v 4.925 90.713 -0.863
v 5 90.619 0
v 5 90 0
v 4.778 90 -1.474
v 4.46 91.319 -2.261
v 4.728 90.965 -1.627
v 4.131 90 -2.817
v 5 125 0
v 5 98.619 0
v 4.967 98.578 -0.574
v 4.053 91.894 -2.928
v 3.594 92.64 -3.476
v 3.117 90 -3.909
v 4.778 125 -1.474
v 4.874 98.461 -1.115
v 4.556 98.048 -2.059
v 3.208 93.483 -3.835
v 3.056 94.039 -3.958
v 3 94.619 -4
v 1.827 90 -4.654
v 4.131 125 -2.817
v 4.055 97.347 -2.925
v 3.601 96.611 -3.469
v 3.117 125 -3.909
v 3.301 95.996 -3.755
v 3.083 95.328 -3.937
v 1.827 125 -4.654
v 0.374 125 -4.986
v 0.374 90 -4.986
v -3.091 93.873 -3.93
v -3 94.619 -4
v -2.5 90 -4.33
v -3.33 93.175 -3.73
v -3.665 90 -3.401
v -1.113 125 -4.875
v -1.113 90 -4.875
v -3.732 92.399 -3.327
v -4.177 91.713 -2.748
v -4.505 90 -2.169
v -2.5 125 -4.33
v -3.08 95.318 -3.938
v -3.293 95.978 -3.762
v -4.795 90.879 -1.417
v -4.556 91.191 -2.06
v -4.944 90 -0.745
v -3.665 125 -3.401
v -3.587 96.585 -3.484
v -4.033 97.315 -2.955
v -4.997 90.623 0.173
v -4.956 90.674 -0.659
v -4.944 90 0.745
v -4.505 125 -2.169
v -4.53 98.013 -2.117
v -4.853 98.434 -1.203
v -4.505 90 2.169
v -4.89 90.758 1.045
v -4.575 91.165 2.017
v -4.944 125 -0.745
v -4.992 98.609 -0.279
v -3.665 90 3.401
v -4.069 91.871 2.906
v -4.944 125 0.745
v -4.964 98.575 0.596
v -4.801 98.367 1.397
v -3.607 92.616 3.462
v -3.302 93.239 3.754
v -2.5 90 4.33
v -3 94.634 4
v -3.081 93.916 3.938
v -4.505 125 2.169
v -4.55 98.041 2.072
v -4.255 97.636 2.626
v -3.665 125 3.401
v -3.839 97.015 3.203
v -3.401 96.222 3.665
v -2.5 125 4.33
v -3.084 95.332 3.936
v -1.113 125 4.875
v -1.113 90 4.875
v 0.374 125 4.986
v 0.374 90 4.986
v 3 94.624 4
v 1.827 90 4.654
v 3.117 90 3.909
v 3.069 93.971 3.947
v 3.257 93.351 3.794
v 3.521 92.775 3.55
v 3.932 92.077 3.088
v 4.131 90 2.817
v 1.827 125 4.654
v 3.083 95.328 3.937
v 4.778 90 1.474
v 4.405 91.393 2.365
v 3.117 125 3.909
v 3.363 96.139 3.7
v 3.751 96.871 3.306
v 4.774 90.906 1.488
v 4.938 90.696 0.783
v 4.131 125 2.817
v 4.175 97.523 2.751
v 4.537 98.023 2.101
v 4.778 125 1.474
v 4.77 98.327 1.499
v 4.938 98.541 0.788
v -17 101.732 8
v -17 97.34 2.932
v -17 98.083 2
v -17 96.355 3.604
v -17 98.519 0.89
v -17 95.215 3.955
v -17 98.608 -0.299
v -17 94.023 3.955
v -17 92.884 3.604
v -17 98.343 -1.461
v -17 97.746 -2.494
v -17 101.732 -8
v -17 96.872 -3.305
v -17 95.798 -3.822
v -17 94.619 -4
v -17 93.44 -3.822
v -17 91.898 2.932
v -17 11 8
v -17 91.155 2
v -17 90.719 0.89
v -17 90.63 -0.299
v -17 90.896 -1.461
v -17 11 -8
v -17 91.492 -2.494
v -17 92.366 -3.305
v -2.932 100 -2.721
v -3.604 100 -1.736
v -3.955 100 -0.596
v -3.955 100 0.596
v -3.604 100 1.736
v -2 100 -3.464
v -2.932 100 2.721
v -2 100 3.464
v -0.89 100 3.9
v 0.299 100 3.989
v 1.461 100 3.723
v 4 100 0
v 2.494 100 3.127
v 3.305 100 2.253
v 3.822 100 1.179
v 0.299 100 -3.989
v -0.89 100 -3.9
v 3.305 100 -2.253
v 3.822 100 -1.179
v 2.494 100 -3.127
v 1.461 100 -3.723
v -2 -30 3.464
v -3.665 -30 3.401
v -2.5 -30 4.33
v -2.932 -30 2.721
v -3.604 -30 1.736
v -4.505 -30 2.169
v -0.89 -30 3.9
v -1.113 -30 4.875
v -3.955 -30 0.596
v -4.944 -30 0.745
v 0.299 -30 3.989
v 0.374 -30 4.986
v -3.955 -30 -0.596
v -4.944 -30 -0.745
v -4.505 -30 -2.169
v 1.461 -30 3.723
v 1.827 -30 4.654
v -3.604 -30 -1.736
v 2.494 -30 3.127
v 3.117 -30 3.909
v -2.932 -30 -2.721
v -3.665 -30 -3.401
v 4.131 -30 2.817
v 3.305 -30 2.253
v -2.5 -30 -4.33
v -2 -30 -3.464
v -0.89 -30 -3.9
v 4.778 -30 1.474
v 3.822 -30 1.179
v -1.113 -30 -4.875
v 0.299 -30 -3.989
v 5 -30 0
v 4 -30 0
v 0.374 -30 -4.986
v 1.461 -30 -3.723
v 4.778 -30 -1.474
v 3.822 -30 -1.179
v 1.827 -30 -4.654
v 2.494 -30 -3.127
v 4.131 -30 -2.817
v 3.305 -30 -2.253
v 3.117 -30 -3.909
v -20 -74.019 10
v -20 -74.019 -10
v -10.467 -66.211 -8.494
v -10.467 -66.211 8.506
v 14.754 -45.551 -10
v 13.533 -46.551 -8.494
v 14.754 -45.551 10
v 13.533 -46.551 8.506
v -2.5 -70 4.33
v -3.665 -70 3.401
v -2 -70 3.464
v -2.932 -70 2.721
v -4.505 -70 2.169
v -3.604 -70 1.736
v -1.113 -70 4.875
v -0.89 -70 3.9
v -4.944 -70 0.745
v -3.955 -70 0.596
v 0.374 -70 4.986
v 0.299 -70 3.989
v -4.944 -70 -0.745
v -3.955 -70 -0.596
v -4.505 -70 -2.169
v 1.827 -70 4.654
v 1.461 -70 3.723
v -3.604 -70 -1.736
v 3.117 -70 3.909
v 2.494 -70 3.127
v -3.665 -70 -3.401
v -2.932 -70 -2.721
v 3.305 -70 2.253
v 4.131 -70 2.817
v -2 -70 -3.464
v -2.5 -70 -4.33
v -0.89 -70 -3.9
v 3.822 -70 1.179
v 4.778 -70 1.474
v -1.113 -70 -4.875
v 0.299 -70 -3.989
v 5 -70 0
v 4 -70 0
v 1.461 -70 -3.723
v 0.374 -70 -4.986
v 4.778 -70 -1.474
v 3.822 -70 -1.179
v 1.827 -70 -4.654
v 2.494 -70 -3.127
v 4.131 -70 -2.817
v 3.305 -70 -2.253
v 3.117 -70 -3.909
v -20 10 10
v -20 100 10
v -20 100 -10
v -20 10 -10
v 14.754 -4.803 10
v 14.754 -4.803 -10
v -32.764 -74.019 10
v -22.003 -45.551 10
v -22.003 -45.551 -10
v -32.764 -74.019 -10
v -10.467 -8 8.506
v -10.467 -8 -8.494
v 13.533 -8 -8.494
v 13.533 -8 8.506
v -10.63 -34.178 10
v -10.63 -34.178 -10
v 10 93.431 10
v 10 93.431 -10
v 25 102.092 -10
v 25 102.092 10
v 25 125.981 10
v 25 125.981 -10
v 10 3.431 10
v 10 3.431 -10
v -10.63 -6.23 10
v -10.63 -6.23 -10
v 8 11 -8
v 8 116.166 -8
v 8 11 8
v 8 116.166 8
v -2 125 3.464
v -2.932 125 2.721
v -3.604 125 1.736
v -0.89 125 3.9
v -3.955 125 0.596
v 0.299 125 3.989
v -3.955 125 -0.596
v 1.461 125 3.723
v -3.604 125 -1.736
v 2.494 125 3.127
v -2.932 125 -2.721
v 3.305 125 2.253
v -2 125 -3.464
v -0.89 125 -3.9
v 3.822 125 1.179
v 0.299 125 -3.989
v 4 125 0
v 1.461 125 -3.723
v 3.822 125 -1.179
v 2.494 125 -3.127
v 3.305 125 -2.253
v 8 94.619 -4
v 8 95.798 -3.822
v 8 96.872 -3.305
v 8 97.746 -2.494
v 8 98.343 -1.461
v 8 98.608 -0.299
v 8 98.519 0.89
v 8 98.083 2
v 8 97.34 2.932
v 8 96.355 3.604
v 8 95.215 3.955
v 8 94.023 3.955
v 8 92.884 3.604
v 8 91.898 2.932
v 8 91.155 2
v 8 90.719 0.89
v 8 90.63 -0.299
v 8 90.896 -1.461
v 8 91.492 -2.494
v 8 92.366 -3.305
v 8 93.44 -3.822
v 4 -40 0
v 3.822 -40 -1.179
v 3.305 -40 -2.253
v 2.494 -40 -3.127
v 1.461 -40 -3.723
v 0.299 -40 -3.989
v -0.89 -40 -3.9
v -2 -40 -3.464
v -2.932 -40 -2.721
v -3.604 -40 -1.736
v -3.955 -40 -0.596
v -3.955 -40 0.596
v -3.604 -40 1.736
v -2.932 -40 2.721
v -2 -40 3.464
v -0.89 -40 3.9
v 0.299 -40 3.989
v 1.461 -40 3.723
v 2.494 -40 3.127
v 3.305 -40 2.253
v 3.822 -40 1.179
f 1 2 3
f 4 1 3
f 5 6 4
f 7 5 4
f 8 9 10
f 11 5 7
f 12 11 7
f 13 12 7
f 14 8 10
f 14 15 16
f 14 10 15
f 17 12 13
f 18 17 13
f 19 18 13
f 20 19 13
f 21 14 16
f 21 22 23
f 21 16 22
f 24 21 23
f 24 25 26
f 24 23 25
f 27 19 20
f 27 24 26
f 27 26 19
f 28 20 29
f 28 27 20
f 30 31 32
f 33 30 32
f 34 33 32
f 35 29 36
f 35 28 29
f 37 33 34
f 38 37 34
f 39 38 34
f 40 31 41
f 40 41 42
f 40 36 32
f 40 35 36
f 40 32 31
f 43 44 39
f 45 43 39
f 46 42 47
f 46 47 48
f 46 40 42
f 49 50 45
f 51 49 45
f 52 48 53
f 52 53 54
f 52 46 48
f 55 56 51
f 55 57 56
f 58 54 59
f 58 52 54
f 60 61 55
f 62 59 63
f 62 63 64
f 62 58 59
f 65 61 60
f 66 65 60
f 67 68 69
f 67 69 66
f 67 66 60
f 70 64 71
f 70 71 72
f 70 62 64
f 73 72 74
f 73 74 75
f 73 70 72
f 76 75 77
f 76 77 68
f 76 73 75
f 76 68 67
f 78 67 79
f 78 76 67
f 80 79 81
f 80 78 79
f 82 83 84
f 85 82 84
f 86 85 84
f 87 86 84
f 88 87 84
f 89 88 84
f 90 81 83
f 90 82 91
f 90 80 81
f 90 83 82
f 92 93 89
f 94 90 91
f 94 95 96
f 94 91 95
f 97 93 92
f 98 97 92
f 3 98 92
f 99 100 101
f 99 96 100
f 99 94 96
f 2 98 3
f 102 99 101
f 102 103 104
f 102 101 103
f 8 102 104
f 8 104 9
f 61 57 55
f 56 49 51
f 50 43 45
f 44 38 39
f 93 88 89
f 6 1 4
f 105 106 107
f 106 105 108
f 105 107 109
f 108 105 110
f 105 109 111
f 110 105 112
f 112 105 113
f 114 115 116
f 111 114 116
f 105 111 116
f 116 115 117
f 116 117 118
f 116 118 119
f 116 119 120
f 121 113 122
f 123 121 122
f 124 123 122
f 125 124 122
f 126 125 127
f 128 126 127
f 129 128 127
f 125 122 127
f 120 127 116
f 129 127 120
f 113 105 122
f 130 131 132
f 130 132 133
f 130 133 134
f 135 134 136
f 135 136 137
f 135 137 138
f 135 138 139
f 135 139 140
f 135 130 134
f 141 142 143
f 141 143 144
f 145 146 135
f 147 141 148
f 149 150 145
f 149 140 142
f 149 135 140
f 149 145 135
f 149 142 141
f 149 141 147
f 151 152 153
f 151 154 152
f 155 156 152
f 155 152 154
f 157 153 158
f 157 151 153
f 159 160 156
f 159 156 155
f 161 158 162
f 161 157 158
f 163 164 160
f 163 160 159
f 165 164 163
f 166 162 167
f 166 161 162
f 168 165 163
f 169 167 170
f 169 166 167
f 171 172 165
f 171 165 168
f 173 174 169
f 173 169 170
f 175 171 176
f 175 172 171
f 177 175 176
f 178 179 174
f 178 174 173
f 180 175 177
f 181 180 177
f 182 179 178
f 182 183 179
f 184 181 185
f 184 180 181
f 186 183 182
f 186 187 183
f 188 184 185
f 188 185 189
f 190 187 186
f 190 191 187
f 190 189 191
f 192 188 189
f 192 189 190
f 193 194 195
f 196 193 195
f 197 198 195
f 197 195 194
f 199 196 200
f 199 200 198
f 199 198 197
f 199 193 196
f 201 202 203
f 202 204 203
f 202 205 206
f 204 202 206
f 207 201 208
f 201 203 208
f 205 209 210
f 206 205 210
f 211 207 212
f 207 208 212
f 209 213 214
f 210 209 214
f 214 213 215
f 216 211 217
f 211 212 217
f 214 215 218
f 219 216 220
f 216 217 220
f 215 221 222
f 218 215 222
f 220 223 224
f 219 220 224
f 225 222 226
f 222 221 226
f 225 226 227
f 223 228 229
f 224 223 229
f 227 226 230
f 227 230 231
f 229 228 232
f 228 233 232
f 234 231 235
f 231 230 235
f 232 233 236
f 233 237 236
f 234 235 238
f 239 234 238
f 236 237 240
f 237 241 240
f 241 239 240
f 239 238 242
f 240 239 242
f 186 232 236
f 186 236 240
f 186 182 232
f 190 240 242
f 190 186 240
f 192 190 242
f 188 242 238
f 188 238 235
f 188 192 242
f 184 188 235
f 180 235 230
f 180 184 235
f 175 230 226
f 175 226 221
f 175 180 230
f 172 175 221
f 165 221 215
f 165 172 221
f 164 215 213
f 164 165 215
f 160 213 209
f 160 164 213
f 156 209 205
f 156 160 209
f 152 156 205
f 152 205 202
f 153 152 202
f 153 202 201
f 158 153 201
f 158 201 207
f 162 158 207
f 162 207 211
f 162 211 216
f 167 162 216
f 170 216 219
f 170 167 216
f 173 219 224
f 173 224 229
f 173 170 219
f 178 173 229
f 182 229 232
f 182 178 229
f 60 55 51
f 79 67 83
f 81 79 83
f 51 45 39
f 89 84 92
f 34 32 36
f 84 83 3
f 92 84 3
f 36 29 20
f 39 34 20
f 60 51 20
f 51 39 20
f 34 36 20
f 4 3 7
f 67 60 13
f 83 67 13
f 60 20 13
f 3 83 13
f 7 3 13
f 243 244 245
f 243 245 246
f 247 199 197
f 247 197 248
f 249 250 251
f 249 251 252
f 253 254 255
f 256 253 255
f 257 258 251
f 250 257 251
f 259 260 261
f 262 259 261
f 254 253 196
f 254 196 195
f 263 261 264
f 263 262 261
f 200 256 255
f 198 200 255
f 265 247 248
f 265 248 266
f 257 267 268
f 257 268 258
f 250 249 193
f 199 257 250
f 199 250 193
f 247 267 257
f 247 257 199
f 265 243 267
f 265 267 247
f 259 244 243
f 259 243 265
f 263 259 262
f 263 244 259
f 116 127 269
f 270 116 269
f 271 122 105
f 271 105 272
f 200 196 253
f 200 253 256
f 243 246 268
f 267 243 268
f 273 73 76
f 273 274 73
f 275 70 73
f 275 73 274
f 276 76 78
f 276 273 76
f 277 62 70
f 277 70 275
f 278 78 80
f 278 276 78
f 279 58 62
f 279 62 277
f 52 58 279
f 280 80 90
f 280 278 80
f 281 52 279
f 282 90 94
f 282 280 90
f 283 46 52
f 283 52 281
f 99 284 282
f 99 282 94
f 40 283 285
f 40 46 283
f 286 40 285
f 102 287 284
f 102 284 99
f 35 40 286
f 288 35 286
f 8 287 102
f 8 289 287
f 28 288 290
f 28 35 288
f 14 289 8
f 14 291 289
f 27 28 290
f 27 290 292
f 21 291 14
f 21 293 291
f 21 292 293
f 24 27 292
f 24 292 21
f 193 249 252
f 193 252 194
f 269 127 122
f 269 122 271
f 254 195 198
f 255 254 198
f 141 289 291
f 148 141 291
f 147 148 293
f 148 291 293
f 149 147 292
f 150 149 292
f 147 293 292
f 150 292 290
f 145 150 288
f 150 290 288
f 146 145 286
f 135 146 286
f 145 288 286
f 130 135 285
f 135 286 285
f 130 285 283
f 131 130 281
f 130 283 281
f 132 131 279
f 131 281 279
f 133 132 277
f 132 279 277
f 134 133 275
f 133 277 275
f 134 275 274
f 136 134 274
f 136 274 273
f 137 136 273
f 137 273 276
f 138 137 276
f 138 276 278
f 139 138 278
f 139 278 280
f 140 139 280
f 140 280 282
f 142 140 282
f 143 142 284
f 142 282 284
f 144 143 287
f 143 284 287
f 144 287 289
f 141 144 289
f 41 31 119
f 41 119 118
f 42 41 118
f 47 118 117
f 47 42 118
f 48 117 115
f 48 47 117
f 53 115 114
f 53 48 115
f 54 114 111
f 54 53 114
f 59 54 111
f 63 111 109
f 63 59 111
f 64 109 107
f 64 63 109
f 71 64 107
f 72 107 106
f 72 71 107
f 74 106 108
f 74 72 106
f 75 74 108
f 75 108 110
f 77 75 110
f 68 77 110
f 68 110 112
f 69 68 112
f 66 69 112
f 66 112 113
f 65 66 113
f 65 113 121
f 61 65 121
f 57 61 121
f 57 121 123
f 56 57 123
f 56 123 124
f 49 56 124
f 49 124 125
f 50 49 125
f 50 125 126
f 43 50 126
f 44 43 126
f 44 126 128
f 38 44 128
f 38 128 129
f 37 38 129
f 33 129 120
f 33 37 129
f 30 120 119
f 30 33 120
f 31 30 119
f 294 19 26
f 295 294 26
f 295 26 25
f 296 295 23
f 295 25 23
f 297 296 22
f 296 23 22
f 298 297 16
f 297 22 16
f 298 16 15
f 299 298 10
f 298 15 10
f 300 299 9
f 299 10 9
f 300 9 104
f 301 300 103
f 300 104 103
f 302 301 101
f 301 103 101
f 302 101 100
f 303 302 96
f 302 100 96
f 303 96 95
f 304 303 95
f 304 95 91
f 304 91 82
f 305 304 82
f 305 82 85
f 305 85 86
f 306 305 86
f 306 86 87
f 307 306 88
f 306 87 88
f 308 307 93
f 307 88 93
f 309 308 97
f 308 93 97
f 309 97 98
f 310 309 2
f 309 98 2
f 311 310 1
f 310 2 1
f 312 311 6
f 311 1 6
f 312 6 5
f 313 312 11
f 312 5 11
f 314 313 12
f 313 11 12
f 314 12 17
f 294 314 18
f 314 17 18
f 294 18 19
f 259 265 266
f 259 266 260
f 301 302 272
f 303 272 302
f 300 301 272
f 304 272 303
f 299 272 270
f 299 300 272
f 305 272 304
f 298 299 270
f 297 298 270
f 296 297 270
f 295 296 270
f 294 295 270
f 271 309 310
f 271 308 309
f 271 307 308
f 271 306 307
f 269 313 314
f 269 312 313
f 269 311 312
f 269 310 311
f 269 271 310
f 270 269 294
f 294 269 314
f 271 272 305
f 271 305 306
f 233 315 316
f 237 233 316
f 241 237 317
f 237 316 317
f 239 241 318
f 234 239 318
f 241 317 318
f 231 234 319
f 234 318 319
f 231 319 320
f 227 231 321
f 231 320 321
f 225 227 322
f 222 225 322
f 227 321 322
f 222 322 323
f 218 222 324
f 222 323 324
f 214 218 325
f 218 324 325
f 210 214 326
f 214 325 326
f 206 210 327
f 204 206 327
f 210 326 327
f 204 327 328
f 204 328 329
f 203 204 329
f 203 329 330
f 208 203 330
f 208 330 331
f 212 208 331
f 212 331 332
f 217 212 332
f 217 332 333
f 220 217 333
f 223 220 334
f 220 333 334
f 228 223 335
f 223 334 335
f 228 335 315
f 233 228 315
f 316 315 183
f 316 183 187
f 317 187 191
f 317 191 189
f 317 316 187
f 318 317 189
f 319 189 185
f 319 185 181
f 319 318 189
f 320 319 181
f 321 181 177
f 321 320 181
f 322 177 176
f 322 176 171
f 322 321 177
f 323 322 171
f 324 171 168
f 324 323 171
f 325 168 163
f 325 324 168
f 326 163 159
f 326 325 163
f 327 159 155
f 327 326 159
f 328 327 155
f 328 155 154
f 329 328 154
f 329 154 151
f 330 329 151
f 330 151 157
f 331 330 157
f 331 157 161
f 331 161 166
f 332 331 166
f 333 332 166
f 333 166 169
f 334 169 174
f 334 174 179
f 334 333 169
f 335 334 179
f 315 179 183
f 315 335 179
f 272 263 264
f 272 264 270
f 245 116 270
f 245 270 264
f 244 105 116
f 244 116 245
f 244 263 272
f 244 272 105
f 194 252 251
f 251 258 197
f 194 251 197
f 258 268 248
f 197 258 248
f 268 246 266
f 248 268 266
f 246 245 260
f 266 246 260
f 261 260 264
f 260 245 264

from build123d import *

# Parameters (mm, degrees)
BOSS_EXTRUDE1_DEPTH      = 10
SKETCH4_W                = 25
SKETCH4_H                = 16
CUT_EXTRUDE1_DEPTH       = 20
CUT_EXTRUDE1_DEPTH_BACK  = 89
SKETCH5_R                = 5
BOSS_EXTRUDE2_DEPTH      = 25
BOSS_EXTRUDE2_DEPTH_BACK = 10
SKETCH7_R                = 4
BOSS_EXTRUDE3_DEPTH      = 10
BOSS_EXTRUDE3_DEPTH_BACK = 18
SKETCH8_R                = 4
CUT_EXTRUDE2_DEPTH       = 25
SKETCH9_W                = 24
SKETCH9_H                = 17
CUT_EXTRUDE3_DEPTH       = 32
CUT_EXTRUDE3_DEPTH_BACK  = 28
SKETCH11_R               = 5
SKETCH11_R_2             = 4
BOSS_EXTRUDE4_DEPTH      = 10
BOSS_EXTRUDE4_DEPTH_BACK = 30


with BuildPart() as part:
    # Sketch2 → Boss-Extrude1 (new body, symmetric)
    with BuildSketch(Plane.XY):
        Polygon((25, 102.091511477), (25, 125.980762114), (-20, 100), (-20, 10), (-10.629510425, -6.230164035), (-10.629510425, -34.17760788), (-22.002554237, -45.550651692), (-32.764034249, -74.019237886), (-20, -74.019237886), (14.753991307, -45.550651692), (14.753991307, -4.802897042), (10, 3.431257439), (10, 93.431257439), align=None)
    extrude(amount=BOSS_EXTRUDE1_DEPTH, both=True)

    # Sketch4 → Cut-Extrude1 (cut, two sides)
    with BuildSketch(Plane(origin=(0, 100, 0), x_dir=(1, 0, 0), z_dir=(0, 1, 0))) as cut_extrude1_sk:
        with Locations((-4.5, 0)):
            Rectangle(SKETCH4_W, SKETCH4_H)
    extrude(amount=CUT_EXTRUDE1_DEPTH, mode=Mode.SUBTRACT)
    extrude(cut_extrude1_sk.sketch, amount=-CUT_EXTRUDE1_DEPTH_BACK, mode=Mode.SUBTRACT)



with BuildPart() as body_2:
    # Sketch5 → Boss-Extrude2 (new body, two sides)
    with BuildSketch(Plane(origin=(0, 100, 0), x_dir=(1, 0, 0), z_dir=(0, 1, 0))) as boss_extrude2_sk:
        Circle(SKETCH5_R)
    extrude(amount=BOSS_EXTRUDE2_DEPTH)
    extrude(boss_extrude2_sk.sketch, amount=-BOSS_EXTRUDE2_DEPTH_BACK)


with BuildPart() as part_1:
    add(part.part)

    add(body_2.part)  # Boss-Extrude3 merges body 2
    # Sketch7 → Boss-Extrude3 (add, two sides)
    with BuildSketch(Plane(origin=(0, 0, 0), x_dir=(0, 0, -1), z_dir=(1, 0, 0))) as boss_extrude3_sk:
        with Locations((0, 94.619147456)):
            Circle(SKETCH7_R)
    extrude(amount=BOSS_EXTRUDE3_DEPTH)
    extrude(boss_extrude3_sk.sketch, amount=-BOSS_EXTRUDE3_DEPTH_BACK)

    # Sketch8 → Cut-Extrude2 (cut)
    with BuildSketch(Plane(origin=(0, 125, 0), x_dir=(1, 0, 0), z_dir=(0, 1, 0))):
        Circle(SKETCH8_R)
    extrude(amount=-CUT_EXTRUDE2_DEPTH, mode=Mode.SUBTRACT)

    # Sketch9 → Cut-Extrude3 (cut, two sides)
    with BuildSketch(Plane(origin=(0, -40, 0), x_dir=(1, 0, 0), z_dir=(0, 1, 0))) as cut_extrude3_sk:
        with Locations((1.532719755, -0.006367264)):
            Rectangle(SKETCH9_W, SKETCH9_H)
    extrude(amount=CUT_EXTRUDE3_DEPTH, mode=Mode.SUBTRACT)
    extrude(cut_extrude3_sk.sketch, amount=-CUT_EXTRUDE3_DEPTH_BACK, mode=Mode.SUBTRACT)


with BuildPart() as body_2_2:
    # Sketch11 → Boss-Extrude4 (new body, two sides)
    with BuildSketch(Plane(origin=(0, -40, 0), x_dir=(1, 0, 0), z_dir=(0, 1, 0))) as boss_extrude4_sk:
        Circle(SKETCH11_R)
        Circle(SKETCH11_R_2, mode=Mode.SUBTRACT)
    extrude(amount=BOSS_EXTRUDE4_DEPTH)
    extrude(boss_extrude4_sk.sketch, amount=-BOSS_EXTRUDE4_DEPTH_BACK)


solid = Compound([part_1.part, body_2_2.part])
